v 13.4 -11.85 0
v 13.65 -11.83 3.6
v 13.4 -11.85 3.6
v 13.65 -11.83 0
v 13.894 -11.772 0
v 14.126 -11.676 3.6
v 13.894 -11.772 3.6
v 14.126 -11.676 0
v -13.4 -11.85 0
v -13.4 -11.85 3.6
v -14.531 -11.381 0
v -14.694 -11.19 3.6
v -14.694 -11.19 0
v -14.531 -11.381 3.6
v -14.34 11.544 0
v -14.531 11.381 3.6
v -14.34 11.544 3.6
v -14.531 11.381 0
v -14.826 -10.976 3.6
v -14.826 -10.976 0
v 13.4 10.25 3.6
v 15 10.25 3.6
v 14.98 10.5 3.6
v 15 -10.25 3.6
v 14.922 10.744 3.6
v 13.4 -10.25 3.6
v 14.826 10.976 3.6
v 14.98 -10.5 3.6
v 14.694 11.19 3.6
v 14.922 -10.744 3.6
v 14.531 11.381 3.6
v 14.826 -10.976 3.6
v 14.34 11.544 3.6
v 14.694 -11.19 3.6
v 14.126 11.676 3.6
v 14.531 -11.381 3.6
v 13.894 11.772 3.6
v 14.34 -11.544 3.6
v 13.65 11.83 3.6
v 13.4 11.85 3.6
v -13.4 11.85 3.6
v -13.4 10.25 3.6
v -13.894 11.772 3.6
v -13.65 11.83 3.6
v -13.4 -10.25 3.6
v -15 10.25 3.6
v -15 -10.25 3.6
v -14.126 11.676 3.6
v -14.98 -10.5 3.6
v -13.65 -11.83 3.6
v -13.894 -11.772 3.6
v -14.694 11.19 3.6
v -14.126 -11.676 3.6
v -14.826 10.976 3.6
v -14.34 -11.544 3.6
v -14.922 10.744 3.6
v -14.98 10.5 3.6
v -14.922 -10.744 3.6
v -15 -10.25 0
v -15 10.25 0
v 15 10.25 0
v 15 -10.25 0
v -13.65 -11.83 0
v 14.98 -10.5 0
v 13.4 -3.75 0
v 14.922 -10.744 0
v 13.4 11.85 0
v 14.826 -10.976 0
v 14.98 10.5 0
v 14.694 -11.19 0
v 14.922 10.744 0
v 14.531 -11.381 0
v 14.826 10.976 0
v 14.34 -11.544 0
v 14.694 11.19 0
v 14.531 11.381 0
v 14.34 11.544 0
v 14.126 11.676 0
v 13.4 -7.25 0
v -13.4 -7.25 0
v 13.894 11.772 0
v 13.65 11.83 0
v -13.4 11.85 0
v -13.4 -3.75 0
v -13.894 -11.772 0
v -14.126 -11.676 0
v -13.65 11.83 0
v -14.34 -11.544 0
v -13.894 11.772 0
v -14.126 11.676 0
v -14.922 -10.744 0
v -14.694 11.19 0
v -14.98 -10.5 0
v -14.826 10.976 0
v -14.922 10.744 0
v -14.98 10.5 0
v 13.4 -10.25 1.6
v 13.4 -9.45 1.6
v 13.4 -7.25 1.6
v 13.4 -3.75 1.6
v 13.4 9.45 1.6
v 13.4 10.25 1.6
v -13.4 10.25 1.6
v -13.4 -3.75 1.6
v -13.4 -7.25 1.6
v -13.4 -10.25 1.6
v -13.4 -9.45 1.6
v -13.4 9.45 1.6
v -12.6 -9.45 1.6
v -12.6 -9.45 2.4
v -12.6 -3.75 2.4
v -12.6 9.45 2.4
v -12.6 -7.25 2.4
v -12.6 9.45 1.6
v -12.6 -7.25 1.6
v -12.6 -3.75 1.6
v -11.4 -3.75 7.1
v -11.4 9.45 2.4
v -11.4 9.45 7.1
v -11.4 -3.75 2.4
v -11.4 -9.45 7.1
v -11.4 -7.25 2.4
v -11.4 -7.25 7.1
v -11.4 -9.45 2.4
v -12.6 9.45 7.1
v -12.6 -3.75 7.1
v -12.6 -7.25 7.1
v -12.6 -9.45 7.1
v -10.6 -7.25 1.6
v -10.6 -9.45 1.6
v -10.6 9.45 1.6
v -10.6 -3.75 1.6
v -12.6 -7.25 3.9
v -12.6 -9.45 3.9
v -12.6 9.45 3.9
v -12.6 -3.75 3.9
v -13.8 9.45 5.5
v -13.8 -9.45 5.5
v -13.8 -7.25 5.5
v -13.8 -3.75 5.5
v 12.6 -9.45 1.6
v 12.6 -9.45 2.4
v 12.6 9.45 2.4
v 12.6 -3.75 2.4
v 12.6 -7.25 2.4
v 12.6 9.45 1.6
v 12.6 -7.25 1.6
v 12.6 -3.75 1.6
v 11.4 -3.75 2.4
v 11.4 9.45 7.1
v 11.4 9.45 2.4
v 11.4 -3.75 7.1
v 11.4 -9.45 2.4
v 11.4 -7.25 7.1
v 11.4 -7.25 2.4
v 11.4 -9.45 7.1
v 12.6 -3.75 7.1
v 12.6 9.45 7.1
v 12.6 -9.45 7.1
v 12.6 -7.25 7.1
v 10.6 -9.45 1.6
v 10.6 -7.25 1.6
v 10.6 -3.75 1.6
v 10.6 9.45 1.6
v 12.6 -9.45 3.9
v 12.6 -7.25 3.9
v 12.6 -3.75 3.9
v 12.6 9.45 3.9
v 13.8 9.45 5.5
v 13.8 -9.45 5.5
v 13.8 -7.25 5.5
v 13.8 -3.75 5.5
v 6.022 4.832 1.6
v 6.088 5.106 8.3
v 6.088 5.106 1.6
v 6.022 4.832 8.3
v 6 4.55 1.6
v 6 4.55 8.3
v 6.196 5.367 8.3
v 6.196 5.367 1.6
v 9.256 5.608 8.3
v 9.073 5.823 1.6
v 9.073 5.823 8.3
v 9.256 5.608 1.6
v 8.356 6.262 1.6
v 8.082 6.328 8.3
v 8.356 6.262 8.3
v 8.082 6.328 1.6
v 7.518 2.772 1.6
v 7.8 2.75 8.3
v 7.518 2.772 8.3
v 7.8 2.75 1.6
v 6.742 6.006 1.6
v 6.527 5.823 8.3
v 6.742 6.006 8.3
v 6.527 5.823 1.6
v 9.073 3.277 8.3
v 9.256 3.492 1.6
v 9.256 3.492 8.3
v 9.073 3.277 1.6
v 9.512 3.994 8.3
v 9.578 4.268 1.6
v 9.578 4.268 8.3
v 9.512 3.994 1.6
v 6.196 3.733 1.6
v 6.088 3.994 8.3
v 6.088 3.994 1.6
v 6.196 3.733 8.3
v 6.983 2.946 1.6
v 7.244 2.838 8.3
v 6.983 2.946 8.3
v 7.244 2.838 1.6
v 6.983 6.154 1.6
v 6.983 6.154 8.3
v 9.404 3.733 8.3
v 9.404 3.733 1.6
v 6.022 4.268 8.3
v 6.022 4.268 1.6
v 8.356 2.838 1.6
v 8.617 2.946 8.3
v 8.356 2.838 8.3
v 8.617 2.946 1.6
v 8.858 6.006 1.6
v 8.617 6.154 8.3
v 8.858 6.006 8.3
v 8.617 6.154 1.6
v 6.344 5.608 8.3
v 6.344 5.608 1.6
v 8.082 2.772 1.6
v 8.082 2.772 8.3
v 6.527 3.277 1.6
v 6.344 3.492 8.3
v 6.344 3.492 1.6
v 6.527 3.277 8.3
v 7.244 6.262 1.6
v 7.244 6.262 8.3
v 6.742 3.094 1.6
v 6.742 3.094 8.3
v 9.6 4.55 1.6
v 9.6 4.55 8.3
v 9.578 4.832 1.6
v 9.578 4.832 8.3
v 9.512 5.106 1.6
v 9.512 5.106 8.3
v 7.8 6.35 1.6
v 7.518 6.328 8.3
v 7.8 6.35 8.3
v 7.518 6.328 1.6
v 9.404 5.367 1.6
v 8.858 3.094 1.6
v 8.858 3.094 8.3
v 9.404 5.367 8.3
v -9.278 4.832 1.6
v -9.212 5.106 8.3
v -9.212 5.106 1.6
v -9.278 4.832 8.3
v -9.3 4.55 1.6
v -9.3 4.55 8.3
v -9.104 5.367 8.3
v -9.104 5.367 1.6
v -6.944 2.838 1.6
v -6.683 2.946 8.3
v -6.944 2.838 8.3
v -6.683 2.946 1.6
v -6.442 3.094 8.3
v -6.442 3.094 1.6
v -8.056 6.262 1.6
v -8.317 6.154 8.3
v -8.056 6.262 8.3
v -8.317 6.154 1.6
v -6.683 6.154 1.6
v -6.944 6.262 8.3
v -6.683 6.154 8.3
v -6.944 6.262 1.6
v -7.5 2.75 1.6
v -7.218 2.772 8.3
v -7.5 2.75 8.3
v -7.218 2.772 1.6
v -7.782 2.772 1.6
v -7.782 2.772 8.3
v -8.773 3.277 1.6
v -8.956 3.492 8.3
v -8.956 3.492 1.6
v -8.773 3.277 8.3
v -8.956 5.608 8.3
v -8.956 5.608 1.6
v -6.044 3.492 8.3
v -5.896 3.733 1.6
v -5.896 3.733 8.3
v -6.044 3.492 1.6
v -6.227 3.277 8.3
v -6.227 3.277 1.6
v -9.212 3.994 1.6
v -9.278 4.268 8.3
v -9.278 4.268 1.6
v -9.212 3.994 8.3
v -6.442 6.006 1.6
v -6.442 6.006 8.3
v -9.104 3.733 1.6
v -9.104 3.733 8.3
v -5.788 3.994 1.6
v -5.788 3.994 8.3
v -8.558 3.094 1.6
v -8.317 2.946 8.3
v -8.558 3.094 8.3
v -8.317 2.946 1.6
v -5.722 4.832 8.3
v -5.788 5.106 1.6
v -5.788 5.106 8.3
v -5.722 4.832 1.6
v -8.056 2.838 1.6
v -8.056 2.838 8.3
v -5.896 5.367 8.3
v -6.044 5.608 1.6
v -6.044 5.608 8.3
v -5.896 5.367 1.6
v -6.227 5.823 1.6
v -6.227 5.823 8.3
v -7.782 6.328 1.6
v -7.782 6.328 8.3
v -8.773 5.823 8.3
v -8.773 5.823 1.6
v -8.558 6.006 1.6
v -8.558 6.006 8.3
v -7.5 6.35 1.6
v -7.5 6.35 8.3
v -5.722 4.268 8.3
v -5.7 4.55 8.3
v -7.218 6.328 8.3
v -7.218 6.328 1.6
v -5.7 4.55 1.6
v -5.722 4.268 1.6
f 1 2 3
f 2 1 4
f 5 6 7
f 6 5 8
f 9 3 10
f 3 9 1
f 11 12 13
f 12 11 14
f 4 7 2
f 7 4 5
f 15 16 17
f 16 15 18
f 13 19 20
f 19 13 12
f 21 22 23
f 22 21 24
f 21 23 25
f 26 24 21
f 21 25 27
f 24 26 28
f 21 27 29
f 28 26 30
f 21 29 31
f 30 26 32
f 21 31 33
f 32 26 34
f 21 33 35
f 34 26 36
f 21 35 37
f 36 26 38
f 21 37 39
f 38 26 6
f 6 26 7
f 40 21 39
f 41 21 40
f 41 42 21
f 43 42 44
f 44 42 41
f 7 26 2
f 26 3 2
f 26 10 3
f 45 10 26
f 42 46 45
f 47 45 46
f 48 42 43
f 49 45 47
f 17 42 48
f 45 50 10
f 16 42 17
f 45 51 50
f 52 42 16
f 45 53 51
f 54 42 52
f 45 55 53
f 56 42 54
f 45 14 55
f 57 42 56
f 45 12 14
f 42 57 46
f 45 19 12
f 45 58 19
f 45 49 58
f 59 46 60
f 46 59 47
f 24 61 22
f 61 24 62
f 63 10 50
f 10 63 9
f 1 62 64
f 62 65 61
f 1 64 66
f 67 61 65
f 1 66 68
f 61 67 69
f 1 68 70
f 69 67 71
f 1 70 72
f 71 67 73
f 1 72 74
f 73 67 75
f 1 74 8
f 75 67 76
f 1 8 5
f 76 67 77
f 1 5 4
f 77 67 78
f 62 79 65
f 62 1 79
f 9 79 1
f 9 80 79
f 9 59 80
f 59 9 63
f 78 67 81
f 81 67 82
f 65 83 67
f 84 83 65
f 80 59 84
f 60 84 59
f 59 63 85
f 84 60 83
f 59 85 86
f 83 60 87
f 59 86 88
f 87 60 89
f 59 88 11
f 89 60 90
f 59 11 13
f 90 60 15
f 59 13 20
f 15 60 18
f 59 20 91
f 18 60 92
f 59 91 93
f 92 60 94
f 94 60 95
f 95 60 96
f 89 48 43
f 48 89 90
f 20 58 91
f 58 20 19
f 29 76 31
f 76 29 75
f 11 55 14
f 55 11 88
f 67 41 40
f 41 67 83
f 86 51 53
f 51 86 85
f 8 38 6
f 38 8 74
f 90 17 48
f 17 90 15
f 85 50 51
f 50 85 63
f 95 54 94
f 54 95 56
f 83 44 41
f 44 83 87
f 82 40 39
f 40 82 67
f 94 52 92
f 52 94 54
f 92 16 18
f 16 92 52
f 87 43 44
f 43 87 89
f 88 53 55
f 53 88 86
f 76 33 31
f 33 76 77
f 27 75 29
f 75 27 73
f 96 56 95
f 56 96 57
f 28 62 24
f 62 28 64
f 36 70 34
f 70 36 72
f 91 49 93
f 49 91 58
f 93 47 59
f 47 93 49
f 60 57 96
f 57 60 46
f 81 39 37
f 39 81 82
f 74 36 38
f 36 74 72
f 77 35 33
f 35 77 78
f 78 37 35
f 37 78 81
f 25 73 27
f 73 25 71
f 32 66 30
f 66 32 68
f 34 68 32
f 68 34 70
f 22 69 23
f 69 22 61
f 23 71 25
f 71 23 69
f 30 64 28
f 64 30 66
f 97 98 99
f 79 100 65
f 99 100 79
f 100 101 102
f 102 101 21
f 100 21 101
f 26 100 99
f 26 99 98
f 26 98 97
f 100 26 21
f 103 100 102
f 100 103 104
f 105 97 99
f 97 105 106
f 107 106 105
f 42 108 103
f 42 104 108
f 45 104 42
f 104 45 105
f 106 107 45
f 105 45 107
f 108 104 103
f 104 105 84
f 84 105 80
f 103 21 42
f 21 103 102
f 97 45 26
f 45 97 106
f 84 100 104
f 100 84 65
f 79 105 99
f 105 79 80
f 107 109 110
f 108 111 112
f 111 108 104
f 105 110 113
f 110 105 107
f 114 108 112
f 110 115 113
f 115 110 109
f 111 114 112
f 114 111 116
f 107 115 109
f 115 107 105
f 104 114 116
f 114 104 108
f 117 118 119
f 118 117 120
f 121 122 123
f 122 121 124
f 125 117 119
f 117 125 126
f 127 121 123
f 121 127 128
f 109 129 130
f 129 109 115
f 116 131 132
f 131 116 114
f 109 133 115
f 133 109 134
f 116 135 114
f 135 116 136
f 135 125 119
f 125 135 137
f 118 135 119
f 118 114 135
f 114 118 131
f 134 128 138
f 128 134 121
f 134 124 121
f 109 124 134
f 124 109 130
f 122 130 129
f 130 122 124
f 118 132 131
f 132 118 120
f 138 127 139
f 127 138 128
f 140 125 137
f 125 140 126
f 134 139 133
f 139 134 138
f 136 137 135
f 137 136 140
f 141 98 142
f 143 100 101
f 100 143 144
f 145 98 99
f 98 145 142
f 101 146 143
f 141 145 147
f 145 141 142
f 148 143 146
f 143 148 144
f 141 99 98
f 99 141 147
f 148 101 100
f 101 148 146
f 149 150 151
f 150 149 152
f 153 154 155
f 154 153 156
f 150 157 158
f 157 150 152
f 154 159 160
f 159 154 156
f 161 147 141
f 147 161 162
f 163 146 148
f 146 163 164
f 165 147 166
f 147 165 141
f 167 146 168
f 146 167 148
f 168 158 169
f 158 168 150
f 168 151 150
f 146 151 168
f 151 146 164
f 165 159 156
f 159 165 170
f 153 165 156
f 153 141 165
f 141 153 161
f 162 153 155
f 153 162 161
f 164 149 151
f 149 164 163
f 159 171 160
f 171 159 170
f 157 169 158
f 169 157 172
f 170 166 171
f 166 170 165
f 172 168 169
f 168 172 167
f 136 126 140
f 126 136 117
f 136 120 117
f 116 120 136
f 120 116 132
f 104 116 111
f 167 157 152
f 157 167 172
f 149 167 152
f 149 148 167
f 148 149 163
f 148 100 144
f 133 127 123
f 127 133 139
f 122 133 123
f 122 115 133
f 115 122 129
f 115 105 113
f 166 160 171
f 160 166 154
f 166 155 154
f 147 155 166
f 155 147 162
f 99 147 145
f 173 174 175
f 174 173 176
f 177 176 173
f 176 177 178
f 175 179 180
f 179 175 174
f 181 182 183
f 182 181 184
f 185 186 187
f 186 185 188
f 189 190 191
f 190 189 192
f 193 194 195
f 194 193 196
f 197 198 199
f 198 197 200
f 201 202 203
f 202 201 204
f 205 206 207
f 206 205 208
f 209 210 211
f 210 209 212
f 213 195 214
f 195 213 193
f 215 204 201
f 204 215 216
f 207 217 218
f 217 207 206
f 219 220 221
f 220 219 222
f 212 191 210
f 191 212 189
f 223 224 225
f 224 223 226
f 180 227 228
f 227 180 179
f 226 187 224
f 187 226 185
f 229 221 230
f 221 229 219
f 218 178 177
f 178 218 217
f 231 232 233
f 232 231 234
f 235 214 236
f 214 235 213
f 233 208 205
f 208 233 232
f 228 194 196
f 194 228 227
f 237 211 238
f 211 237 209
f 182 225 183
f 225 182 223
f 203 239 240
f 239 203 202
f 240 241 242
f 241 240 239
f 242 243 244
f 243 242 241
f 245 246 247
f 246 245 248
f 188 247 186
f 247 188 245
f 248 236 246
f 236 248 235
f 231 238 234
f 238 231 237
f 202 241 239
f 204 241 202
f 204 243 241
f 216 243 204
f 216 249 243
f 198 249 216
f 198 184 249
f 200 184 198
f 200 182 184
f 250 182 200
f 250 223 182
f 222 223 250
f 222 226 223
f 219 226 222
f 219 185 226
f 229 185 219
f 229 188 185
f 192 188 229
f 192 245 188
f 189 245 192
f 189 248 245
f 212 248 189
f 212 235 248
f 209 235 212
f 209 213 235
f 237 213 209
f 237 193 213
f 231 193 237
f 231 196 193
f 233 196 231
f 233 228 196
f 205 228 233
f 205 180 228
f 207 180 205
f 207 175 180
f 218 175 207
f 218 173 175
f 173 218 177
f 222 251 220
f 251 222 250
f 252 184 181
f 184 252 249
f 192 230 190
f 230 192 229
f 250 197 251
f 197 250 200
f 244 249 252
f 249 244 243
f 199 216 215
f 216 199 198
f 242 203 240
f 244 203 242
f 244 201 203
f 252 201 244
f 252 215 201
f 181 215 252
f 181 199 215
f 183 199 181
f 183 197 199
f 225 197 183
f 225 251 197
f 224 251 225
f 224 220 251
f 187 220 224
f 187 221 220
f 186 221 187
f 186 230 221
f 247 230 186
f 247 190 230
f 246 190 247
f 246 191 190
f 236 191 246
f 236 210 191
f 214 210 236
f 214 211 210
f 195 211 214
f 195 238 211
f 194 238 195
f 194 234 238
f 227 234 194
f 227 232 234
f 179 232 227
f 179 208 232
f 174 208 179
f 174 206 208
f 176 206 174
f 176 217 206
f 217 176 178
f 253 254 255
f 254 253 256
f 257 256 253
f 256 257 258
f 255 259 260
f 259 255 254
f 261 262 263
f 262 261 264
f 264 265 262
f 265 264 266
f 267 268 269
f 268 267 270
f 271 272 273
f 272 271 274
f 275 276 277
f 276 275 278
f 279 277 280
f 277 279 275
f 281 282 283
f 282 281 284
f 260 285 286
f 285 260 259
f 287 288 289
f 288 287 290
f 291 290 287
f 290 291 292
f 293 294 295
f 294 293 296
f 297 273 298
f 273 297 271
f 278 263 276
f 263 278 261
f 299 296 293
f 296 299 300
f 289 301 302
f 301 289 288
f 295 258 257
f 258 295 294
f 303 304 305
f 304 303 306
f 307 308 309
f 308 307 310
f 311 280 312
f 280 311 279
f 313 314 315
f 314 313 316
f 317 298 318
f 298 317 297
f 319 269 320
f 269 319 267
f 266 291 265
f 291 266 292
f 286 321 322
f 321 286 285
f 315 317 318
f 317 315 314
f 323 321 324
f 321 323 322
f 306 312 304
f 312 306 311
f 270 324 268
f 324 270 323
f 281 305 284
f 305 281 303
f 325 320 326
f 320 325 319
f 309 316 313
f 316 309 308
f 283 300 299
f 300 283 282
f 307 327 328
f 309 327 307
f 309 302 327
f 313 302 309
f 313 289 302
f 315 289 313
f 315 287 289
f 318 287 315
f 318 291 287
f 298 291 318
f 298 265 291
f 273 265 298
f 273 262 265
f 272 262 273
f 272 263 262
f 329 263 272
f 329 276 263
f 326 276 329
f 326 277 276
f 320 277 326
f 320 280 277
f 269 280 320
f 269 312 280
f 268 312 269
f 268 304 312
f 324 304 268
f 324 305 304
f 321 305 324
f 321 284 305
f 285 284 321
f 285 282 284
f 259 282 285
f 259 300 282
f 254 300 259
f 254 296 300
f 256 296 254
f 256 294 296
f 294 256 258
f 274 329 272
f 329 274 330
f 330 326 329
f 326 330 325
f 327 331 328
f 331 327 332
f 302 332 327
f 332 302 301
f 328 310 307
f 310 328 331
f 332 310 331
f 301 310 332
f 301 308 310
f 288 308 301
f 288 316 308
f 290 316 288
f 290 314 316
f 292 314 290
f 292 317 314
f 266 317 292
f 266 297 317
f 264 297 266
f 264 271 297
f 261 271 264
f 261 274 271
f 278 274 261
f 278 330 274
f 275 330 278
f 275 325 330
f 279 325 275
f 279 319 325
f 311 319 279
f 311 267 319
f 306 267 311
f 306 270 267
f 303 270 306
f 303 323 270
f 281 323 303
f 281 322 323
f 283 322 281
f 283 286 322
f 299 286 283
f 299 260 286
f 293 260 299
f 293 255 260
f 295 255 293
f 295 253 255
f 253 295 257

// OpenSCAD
sensorWidth = 20.8;
sensorDepth = 14.5;
sensorHeight = 5; // height from the tips of solderings on the bottom up to the highest component on the top
spaceing = 3;

pcbClerance = 1.8; // clearance underneath the pcb. Determines the height of the pcb standoffs.
pcbHoles = [[2.6,11.8],[17.9, 11.8]];  // relative to lower left corner
pcbHoleDia = 2.6;
pcbThickness = 1.5;

boxWidth = sensorWidth+2*spaceing;
boxDepth = sensorDepth+2*spaceing;
boxHeight = sensorHeight+spaceing;

wallThickness = 1.6;

lidHeight = 2;
lSlidWidth = 3.5;

clipThickness = 1.2;
clipHeight = 3.5;
clipTolerance = 0.1;

$fn = 40;


bottom();
translate([0,0,boxHeight+lidHeight+wallThickness*2])rotate([180,0,180])!lid();
translate([-sensorWidth/2,-sensorDepth/2,wallThickness])pcbDummy();


module bottom(){
    difference(){
        linear_extrude(boxHeight+wallThickness)offset(wallThickness)square([boxWidth,boxDepth], center = true);
        translate([0,0,boxHeight/2+wallThickness])cube([boxWidth,boxDepth,boxHeight+1], center = true);
        // clip holes are placed relative to the top left and right coron of the box. 
        translate([-boxWidth/2,  boxDepth/2, boxHeight+wallThickness])rotate([180,0,0])clipHole();
        translate([boxWidth/2,   boxDepth/2, boxHeight+wallThickness])rotate([180,0,0])mirror([1,0,0])clipHole();
    }

    //standoffs
    translate([-sensorWidth/2, -sensorDepth/2,wallThickness])standoffs();

    //support under pins
    translate([-sensorWidth/2, -sensorDepth/2,wallThickness])cube([sensorWidth,1.2,pcbClerance-0.8]);


}

// lid
module lid(){
    difference(){
        linear_extrude(lidHeight+wallThickness)offset(wallThickness)square([boxWidth,boxDepth], center = true);
        translate([-boxWidth/2,-boxDepth/2,wallThickness])cube([boxWidth,boxDepth,boxHeight+1]);
        translate([-boxWidth/2, -boxDepth/2+spaceing, -100])cube([boxWidth,lSlidWidth,200]);
    }
    // clips
    difference(){
        union(){
            translate([-boxWidth/2,-boxDepth/2, wallThickness])clip();
            translate([boxWidth/2,-boxDepth/2, wallThickness])mirror([1,0,0])clip();
        }
        translate([-boxWidth, -boxDepth/2+spaceing, -100])cube([boxWidth*2,lSlidWidth,200]);

    }
    mirror([1,0,0])
    translate([-sensorWidth/2, -sensorDepth/2,wallThickness])
    for(i = pcbHoles){
        translate(i)cylinder(d=pcbHoleDia+1,h=lidHeight+boxHeight-pcbClerance-pcbThickness);      
    }     
    

}


module clip(){
    length = boxDepth-1.6;

    translate([0,0.8]){    
        rotate([-90,0,0])linear_extrude(length)polygon([[0,0],[0.8,0],[0.8,-0.8]]);
        translate([0.8,0,0])cube([clipThickness,length,lidHeight+clipHeight]);
        translate([0.8+clipThickness,0,0])rotate([-90,0,0])linear_extrude(length)polygon([[0,0],[0.8,0],[0,-0.8]]);
        translate([0.8,0,lidHeight+clipHeight])rotate([-90,0,0,])
            linear_extrude(length)
                polygon([[0,0],[-1.2,0.8*2],[0,0.8*4]]);
    }
}

module clipHole(){
    translate([0.8-clipTolerance,0,clipHeight])rotate([-90,0,0,])
        linear_extrude(boxDepth)
                polygon([[0,0],[-1.2,0.8*2],[0,0.8*4]]);
}

module pcbDummy(){
    if ($preview){
        color("green")
        translate([0,0,pcbClerance])
        linear_extrude(sensorHeight-pcbClerance)difference(){
            square([sensorWidth,sensorDepth]);
            for(i = pcbHoles){
                translate(i)circle(d=pcbHoleDia);
            }
        }
    }
}

module standoffs(){
    for(i = pcbHoles){
        linear_extrude(pcbClerance+pcbThickness){
            translate(i)circle(d=pcbHoleDia); 
        } 
        linear_extrude(pcbClerance){
            difference(){
                translate(i)circle(d=pcbHoleDia+2);
                translate(i)circle(d=pcbHoleDia-1);
            }    
        }
    }
}
